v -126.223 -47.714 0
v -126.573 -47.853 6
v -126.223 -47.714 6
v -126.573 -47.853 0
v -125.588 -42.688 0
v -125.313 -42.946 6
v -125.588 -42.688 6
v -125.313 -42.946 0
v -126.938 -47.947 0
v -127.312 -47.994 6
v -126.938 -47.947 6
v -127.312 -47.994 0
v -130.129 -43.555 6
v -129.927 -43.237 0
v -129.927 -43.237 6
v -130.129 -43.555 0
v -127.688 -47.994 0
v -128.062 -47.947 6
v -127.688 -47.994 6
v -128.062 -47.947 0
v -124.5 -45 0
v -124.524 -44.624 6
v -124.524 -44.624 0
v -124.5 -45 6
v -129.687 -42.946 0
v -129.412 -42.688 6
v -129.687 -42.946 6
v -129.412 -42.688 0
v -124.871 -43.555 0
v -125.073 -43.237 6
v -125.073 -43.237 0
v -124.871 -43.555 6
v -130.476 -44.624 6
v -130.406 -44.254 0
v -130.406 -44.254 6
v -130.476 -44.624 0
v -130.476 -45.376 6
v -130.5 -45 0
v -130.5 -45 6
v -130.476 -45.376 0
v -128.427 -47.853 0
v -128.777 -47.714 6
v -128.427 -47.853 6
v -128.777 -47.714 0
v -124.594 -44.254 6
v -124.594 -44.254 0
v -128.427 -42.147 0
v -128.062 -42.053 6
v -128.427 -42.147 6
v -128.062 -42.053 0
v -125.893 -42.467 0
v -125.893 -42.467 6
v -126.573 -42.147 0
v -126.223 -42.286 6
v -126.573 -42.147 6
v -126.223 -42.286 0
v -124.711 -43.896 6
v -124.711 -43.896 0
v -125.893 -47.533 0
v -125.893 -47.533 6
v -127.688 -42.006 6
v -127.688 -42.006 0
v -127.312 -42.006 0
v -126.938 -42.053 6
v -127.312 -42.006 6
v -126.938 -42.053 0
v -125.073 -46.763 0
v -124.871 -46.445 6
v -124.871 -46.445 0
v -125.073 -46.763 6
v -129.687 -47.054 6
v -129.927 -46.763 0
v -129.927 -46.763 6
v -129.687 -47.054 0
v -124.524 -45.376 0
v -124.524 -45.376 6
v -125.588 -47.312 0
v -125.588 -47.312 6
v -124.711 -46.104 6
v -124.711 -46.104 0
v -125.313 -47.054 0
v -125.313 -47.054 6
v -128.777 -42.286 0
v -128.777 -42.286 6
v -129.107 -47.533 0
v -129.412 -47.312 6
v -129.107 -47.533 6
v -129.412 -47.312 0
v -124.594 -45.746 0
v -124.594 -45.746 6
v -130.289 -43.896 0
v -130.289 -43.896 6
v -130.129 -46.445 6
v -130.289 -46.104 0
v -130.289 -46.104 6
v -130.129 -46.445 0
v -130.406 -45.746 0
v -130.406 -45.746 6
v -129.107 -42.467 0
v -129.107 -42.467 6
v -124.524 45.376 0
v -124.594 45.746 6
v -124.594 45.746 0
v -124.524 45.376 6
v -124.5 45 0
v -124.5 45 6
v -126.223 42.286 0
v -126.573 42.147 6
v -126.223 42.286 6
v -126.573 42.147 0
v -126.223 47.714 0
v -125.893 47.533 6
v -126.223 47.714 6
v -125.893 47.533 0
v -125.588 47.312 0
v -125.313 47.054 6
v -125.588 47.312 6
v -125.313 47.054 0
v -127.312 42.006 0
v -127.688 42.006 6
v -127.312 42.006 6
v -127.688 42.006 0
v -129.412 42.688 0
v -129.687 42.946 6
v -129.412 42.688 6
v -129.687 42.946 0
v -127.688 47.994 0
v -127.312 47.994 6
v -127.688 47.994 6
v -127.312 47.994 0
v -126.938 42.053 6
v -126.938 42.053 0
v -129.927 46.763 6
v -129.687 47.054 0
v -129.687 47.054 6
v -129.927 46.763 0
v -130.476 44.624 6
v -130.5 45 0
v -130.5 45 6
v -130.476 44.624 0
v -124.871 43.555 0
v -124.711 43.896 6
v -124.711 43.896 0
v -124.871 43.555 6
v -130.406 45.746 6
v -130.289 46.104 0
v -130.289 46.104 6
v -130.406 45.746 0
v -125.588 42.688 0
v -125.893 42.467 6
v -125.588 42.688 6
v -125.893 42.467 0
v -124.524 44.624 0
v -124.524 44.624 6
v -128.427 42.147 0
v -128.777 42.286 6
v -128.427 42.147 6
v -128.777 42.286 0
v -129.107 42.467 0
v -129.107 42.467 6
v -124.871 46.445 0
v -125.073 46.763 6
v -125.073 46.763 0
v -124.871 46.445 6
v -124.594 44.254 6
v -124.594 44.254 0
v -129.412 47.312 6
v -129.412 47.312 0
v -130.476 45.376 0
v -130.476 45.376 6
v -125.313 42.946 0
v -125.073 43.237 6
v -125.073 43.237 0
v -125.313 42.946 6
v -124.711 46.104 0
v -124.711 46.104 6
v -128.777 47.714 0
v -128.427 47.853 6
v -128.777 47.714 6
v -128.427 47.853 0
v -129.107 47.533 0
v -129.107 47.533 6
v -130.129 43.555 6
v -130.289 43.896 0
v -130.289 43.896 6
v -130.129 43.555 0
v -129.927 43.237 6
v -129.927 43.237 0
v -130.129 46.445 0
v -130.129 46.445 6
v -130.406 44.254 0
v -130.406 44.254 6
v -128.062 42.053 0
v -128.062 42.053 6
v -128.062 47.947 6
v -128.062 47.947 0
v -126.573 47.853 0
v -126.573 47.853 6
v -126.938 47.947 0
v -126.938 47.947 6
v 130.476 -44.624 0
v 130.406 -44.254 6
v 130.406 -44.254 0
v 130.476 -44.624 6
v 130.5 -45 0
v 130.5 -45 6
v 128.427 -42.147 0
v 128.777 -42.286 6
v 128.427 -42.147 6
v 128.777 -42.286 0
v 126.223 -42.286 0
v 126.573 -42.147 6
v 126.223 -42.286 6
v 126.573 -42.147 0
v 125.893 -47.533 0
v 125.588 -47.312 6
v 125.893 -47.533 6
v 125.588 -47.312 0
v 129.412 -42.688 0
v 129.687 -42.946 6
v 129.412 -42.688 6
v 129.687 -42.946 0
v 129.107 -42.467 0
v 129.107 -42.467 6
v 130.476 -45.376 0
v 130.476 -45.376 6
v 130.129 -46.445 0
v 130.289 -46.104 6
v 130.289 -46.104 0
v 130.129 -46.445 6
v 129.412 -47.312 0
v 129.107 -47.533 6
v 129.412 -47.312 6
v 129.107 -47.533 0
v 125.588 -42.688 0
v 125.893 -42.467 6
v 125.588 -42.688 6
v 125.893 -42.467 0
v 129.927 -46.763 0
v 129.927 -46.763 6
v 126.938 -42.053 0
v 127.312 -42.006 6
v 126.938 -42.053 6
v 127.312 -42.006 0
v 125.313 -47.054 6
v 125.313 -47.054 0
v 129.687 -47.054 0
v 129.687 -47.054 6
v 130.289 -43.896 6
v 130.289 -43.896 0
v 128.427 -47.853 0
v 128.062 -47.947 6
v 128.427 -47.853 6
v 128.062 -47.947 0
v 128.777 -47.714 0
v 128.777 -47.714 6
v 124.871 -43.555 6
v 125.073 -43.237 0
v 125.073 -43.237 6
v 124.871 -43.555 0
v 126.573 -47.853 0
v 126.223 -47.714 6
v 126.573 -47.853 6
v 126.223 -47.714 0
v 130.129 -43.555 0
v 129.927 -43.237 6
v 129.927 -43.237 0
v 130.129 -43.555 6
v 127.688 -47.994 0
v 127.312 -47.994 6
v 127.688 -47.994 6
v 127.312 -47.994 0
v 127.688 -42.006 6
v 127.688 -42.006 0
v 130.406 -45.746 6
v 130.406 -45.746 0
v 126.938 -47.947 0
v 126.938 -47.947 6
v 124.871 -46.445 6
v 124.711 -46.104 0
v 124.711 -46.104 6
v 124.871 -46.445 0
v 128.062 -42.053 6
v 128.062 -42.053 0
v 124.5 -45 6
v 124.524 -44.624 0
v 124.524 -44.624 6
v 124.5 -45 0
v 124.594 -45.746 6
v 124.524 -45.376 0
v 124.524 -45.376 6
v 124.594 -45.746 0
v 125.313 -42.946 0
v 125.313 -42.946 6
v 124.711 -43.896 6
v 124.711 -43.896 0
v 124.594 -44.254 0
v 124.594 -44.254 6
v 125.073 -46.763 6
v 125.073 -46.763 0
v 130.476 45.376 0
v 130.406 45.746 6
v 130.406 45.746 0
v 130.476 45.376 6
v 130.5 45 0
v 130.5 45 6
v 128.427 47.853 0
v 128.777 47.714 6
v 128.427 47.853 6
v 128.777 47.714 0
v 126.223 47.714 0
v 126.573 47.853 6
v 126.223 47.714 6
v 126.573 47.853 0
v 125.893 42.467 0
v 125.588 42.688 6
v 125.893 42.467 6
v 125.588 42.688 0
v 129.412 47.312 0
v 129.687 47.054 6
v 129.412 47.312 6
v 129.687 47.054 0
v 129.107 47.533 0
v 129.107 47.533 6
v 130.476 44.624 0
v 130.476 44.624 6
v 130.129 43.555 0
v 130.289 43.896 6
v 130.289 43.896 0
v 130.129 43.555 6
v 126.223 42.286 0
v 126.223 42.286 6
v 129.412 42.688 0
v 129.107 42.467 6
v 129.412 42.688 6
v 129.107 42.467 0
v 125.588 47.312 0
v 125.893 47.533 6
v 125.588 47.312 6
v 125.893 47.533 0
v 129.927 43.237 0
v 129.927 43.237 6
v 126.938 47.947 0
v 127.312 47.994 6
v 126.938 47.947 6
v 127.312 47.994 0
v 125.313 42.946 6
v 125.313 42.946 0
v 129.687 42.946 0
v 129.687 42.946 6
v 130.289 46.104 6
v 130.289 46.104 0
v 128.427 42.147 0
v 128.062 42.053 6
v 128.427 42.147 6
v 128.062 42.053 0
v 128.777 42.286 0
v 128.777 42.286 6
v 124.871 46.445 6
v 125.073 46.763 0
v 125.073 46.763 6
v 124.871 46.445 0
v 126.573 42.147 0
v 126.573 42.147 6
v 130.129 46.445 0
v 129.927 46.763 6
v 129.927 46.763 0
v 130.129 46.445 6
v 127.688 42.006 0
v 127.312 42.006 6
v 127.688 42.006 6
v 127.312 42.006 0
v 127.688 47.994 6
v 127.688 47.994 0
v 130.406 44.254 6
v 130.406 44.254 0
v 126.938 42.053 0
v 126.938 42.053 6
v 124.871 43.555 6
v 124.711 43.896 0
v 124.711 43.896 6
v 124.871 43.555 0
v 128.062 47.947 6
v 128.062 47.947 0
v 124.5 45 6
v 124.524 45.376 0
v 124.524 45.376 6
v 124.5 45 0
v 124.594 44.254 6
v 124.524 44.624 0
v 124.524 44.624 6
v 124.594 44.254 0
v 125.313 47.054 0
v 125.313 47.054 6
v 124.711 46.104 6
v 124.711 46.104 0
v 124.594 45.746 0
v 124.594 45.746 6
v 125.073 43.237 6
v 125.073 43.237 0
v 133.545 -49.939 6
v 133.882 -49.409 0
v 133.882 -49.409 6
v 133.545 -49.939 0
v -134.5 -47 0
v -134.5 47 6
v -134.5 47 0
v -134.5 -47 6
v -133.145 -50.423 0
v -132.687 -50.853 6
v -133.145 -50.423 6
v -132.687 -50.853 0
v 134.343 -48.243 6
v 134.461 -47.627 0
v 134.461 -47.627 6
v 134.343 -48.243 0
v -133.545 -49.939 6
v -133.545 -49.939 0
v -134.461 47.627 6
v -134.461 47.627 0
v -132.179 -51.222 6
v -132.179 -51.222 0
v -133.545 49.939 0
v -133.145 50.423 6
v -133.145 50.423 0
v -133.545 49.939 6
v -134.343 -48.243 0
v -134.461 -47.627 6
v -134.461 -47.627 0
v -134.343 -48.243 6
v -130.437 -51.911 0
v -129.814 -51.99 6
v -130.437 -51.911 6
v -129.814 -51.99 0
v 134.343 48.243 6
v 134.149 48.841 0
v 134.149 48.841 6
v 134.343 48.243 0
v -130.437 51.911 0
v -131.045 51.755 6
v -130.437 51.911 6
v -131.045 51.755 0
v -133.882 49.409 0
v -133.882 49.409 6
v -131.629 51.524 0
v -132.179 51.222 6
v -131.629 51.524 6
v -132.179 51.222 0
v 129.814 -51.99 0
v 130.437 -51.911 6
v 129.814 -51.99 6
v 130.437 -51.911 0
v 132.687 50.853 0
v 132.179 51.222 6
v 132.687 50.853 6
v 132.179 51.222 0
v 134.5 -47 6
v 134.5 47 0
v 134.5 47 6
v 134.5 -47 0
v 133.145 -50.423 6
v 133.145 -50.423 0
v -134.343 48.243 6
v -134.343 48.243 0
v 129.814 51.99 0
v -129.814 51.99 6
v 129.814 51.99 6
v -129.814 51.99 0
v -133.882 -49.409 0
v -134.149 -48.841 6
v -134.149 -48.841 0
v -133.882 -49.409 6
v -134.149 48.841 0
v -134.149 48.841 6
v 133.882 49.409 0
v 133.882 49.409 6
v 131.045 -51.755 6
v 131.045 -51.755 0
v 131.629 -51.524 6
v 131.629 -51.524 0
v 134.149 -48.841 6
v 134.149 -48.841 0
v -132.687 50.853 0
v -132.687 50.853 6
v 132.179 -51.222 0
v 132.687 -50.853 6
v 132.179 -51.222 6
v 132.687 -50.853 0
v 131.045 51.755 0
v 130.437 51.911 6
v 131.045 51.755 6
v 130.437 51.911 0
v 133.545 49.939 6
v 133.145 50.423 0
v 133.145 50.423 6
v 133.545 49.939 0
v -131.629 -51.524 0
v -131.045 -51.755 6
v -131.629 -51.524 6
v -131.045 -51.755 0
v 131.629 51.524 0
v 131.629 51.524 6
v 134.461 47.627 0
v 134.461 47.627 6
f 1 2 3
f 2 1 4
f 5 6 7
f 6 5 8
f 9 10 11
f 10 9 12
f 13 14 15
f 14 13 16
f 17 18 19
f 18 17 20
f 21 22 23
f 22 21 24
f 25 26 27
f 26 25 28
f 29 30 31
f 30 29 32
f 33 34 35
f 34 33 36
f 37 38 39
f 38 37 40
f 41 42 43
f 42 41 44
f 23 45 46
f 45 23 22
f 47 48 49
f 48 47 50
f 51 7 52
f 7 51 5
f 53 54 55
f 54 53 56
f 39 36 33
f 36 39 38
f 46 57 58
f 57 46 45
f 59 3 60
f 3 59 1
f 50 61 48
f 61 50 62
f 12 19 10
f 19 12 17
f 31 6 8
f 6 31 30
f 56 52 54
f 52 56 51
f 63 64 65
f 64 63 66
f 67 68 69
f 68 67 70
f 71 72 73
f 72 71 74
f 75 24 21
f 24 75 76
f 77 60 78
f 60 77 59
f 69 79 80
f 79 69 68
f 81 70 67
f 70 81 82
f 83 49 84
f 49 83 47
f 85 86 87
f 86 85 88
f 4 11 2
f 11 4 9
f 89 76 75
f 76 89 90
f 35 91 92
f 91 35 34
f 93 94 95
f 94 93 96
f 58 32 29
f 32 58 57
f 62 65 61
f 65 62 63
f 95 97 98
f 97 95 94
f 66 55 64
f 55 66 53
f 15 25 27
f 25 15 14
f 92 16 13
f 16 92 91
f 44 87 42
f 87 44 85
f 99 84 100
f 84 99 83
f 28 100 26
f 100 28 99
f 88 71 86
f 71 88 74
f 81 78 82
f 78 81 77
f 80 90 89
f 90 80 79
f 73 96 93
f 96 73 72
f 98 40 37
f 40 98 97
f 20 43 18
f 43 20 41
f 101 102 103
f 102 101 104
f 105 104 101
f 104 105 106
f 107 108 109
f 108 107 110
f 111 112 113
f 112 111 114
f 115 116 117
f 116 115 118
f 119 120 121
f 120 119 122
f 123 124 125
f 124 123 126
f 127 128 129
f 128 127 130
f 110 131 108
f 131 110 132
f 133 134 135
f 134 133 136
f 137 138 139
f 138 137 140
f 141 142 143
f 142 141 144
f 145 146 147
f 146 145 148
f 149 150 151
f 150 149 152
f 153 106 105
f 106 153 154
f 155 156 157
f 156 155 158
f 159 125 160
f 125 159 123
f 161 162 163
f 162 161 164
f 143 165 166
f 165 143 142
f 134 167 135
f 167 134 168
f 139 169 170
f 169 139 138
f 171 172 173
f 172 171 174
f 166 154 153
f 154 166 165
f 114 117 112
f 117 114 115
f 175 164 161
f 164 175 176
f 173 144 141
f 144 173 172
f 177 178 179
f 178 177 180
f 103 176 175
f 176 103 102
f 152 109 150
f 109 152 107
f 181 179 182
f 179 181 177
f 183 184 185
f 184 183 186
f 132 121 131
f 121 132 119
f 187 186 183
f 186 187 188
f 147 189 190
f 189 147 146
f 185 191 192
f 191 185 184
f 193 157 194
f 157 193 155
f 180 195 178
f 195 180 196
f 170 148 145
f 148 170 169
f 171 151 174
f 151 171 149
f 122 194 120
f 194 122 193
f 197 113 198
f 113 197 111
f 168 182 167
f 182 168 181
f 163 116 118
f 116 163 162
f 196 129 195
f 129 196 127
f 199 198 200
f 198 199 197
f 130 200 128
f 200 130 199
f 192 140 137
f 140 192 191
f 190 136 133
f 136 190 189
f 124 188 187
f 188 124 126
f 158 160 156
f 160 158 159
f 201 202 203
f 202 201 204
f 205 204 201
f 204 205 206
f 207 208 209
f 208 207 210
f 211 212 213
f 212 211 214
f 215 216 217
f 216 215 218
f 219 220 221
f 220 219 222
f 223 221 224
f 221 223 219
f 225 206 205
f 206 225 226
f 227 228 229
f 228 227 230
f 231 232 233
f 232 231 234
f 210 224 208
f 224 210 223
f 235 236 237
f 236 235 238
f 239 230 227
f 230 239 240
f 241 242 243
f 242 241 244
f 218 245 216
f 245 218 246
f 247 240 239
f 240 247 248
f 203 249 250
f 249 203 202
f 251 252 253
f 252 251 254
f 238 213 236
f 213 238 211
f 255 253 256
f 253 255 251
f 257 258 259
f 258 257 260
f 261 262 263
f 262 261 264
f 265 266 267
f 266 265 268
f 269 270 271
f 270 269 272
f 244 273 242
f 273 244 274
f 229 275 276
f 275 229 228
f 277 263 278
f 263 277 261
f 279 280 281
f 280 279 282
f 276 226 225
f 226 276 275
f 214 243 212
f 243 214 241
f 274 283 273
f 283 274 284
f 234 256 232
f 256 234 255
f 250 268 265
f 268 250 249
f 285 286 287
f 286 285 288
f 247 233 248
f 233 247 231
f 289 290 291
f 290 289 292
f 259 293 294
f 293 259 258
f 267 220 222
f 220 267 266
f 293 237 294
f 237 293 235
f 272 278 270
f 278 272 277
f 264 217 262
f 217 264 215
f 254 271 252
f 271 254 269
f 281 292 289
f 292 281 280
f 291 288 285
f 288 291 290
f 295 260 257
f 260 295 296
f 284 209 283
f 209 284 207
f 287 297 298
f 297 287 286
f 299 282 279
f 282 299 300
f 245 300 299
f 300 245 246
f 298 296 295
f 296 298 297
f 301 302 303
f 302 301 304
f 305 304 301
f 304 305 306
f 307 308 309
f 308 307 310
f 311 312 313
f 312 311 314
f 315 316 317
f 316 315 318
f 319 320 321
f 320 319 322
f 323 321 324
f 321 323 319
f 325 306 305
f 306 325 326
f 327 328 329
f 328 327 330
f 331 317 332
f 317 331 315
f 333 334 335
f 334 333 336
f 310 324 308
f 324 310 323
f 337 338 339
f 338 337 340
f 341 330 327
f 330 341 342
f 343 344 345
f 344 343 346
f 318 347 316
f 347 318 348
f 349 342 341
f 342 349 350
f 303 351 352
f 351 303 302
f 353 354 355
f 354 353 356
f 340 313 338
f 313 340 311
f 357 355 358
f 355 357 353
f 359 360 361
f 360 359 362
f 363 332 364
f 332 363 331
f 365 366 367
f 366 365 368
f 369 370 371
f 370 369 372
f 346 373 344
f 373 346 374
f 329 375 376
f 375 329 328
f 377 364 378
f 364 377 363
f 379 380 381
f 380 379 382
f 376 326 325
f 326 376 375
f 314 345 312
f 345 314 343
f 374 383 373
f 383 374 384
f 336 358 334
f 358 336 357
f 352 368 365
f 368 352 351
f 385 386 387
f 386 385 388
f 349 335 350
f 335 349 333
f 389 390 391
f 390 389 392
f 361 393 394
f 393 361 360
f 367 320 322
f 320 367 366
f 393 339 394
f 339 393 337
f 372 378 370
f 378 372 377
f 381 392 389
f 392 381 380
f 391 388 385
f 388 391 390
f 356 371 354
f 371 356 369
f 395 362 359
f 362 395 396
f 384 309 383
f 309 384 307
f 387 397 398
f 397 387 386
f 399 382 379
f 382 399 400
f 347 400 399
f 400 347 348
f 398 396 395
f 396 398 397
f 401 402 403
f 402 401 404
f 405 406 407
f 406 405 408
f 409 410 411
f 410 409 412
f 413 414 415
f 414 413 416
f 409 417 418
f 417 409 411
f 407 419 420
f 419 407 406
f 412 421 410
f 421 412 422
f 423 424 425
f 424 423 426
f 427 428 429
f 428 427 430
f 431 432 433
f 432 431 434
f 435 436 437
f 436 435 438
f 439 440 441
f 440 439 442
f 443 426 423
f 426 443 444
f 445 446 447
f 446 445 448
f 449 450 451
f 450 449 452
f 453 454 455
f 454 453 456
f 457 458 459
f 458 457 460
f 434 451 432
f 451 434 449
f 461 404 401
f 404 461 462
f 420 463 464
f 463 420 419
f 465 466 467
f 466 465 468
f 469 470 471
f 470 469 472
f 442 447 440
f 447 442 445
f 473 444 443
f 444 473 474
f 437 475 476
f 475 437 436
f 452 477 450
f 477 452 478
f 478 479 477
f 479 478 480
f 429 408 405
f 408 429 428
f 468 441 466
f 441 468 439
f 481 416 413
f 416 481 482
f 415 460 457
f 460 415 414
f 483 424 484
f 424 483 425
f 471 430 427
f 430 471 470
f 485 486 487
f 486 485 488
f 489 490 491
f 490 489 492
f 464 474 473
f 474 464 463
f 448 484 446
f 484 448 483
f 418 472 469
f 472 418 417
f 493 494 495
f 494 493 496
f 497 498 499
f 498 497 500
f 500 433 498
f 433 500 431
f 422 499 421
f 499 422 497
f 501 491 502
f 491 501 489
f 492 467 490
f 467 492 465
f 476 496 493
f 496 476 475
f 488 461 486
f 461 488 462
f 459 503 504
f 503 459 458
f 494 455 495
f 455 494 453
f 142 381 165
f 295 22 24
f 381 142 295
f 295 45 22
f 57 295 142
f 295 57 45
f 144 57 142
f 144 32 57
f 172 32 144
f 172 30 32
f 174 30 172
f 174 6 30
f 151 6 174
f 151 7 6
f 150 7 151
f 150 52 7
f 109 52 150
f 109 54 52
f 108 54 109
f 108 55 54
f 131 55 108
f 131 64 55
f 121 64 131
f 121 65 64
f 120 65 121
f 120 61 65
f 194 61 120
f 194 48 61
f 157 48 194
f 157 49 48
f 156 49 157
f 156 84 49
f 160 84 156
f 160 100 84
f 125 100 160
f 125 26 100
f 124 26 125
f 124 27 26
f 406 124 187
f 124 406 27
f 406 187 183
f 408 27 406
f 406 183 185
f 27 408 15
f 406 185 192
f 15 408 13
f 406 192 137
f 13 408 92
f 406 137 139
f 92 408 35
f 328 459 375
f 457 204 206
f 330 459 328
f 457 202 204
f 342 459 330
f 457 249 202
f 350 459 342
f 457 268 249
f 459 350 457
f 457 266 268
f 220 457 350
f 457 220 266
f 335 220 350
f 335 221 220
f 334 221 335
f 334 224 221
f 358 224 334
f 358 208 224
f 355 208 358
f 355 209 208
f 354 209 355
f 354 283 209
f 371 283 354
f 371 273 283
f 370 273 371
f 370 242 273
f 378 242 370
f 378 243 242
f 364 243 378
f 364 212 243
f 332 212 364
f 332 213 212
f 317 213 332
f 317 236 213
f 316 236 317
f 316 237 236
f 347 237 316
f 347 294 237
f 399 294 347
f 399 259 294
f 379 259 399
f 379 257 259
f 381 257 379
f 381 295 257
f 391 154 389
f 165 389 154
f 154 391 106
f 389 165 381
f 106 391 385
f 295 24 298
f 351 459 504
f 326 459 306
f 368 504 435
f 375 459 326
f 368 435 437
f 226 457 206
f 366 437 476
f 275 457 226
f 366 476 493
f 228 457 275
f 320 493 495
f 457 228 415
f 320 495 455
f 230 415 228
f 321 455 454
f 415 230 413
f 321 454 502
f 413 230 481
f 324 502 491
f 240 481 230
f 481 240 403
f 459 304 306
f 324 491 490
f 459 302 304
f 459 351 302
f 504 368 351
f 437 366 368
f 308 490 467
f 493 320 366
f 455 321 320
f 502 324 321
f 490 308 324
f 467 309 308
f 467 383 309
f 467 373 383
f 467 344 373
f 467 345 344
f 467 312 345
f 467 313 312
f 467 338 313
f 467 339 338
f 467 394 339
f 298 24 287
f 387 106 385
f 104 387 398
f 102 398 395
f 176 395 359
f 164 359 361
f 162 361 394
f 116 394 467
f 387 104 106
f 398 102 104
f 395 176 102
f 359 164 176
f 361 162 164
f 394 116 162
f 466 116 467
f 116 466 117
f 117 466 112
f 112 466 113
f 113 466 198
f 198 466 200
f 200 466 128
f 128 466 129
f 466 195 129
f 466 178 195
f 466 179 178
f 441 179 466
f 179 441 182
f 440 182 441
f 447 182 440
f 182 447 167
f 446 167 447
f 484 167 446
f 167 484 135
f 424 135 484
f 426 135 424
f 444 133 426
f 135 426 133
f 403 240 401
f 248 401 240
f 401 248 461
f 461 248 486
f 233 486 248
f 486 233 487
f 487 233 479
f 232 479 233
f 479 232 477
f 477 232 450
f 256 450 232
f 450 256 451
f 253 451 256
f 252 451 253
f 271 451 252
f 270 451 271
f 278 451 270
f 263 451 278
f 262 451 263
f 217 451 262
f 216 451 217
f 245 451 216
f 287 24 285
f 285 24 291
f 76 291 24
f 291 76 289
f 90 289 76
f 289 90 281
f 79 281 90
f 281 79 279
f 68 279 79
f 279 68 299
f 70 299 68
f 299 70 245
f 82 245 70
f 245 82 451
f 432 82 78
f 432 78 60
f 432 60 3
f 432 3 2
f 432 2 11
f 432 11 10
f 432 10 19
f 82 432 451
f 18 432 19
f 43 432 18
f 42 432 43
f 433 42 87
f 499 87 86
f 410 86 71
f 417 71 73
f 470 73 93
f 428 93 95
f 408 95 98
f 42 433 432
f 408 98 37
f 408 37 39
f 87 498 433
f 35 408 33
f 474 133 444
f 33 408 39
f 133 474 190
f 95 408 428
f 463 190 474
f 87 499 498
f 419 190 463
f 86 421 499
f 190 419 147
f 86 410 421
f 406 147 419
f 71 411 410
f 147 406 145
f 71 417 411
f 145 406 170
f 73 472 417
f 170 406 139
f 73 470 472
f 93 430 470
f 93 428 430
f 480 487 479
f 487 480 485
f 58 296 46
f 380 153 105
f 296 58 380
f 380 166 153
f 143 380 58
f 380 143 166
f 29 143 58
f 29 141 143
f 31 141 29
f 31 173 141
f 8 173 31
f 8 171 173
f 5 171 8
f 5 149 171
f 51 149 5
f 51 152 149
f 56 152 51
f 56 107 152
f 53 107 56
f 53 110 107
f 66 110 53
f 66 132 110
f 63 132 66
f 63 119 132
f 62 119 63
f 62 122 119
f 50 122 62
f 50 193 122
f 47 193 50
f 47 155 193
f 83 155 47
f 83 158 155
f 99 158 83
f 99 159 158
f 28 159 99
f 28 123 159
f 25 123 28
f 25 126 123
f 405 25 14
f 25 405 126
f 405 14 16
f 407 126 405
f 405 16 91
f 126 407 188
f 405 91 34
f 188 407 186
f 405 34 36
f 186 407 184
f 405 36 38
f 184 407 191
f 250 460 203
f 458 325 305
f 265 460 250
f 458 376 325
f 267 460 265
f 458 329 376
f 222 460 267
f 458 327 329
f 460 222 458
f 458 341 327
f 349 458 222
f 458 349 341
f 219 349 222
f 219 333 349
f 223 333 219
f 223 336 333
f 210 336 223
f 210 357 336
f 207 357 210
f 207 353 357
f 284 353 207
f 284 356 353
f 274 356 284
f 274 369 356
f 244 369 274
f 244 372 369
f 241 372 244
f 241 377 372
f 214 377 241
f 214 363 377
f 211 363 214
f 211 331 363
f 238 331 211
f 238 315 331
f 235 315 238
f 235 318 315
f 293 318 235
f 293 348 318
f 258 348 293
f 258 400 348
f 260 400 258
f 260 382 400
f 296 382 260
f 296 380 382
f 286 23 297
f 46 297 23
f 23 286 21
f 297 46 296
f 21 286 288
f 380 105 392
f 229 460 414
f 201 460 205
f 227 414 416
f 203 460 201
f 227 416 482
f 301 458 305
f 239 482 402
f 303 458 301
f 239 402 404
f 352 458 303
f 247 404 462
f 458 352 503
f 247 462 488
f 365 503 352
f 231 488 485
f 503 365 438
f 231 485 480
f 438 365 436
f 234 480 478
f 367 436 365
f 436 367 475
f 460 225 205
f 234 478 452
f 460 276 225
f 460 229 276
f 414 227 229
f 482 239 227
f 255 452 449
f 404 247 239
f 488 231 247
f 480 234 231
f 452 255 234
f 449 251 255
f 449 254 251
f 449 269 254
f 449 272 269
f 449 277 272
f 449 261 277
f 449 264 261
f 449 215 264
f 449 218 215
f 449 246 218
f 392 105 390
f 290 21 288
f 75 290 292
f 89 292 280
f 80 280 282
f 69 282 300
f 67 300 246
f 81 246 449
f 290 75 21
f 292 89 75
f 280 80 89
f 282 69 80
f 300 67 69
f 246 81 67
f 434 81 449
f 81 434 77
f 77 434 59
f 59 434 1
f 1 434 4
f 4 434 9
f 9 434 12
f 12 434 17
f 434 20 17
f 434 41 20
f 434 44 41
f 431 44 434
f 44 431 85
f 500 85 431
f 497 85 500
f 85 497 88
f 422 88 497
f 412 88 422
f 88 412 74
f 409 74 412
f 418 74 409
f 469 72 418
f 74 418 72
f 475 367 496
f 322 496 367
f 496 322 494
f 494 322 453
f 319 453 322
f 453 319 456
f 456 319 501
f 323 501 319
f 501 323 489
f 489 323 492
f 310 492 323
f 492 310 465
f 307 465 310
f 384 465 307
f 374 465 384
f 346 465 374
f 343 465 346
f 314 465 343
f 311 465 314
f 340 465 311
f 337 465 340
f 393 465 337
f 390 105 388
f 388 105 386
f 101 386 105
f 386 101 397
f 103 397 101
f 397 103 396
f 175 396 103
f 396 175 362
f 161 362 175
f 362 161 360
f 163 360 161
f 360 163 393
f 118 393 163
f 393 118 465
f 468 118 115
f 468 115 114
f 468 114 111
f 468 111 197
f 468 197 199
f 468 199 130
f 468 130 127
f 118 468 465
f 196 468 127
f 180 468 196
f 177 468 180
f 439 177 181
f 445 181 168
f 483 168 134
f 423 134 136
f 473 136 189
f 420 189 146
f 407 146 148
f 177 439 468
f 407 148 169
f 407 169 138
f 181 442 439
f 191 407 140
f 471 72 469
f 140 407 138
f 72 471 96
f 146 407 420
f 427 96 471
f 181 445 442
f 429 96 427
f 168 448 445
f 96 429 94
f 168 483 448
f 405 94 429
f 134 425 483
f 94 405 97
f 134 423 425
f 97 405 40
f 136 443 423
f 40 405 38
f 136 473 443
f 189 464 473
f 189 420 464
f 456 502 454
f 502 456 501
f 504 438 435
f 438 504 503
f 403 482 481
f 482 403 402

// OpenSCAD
$fn = 50;


difference() {
	union() {
		hull() {
			translate(v = [-129.5000000000, 47.0000000000, 0]) {
				cylinder(h = 6, r = 5);
			}
			translate(v = [129.5000000000, 47.0000000000, 0]) {
				cylinder(h = 6, r = 5);
			}
			translate(v = [-129.5000000000, -47.0000000000, 0]) {
				cylinder(h = 6, r = 5);
			}
			translate(v = [129.5000000000, -47.0000000000, 0]) {
				cylinder(h = 6, r = 5);
			}
		}
	}
	union() {
		translate(v = [-127.5000000000, -45.0000000000, -100.0000000000]) {
			cylinder(h = 200, r = 3.0000000000);
		}
		translate(v = [-127.5000000000, 45.0000000000, -100.0000000000]) {
			cylinder(h = 200, r = 3.0000000000);
		}
		translate(v = [127.5000000000, -45.0000000000, -100.0000000000]) {
			cylinder(h = 200, r = 3.0000000000);
		}
		translate(v = [127.5000000000, 45.0000000000, -100.0000000000]) {
			cylinder(h = 200, r = 3.0000000000);
		}
	}
}
